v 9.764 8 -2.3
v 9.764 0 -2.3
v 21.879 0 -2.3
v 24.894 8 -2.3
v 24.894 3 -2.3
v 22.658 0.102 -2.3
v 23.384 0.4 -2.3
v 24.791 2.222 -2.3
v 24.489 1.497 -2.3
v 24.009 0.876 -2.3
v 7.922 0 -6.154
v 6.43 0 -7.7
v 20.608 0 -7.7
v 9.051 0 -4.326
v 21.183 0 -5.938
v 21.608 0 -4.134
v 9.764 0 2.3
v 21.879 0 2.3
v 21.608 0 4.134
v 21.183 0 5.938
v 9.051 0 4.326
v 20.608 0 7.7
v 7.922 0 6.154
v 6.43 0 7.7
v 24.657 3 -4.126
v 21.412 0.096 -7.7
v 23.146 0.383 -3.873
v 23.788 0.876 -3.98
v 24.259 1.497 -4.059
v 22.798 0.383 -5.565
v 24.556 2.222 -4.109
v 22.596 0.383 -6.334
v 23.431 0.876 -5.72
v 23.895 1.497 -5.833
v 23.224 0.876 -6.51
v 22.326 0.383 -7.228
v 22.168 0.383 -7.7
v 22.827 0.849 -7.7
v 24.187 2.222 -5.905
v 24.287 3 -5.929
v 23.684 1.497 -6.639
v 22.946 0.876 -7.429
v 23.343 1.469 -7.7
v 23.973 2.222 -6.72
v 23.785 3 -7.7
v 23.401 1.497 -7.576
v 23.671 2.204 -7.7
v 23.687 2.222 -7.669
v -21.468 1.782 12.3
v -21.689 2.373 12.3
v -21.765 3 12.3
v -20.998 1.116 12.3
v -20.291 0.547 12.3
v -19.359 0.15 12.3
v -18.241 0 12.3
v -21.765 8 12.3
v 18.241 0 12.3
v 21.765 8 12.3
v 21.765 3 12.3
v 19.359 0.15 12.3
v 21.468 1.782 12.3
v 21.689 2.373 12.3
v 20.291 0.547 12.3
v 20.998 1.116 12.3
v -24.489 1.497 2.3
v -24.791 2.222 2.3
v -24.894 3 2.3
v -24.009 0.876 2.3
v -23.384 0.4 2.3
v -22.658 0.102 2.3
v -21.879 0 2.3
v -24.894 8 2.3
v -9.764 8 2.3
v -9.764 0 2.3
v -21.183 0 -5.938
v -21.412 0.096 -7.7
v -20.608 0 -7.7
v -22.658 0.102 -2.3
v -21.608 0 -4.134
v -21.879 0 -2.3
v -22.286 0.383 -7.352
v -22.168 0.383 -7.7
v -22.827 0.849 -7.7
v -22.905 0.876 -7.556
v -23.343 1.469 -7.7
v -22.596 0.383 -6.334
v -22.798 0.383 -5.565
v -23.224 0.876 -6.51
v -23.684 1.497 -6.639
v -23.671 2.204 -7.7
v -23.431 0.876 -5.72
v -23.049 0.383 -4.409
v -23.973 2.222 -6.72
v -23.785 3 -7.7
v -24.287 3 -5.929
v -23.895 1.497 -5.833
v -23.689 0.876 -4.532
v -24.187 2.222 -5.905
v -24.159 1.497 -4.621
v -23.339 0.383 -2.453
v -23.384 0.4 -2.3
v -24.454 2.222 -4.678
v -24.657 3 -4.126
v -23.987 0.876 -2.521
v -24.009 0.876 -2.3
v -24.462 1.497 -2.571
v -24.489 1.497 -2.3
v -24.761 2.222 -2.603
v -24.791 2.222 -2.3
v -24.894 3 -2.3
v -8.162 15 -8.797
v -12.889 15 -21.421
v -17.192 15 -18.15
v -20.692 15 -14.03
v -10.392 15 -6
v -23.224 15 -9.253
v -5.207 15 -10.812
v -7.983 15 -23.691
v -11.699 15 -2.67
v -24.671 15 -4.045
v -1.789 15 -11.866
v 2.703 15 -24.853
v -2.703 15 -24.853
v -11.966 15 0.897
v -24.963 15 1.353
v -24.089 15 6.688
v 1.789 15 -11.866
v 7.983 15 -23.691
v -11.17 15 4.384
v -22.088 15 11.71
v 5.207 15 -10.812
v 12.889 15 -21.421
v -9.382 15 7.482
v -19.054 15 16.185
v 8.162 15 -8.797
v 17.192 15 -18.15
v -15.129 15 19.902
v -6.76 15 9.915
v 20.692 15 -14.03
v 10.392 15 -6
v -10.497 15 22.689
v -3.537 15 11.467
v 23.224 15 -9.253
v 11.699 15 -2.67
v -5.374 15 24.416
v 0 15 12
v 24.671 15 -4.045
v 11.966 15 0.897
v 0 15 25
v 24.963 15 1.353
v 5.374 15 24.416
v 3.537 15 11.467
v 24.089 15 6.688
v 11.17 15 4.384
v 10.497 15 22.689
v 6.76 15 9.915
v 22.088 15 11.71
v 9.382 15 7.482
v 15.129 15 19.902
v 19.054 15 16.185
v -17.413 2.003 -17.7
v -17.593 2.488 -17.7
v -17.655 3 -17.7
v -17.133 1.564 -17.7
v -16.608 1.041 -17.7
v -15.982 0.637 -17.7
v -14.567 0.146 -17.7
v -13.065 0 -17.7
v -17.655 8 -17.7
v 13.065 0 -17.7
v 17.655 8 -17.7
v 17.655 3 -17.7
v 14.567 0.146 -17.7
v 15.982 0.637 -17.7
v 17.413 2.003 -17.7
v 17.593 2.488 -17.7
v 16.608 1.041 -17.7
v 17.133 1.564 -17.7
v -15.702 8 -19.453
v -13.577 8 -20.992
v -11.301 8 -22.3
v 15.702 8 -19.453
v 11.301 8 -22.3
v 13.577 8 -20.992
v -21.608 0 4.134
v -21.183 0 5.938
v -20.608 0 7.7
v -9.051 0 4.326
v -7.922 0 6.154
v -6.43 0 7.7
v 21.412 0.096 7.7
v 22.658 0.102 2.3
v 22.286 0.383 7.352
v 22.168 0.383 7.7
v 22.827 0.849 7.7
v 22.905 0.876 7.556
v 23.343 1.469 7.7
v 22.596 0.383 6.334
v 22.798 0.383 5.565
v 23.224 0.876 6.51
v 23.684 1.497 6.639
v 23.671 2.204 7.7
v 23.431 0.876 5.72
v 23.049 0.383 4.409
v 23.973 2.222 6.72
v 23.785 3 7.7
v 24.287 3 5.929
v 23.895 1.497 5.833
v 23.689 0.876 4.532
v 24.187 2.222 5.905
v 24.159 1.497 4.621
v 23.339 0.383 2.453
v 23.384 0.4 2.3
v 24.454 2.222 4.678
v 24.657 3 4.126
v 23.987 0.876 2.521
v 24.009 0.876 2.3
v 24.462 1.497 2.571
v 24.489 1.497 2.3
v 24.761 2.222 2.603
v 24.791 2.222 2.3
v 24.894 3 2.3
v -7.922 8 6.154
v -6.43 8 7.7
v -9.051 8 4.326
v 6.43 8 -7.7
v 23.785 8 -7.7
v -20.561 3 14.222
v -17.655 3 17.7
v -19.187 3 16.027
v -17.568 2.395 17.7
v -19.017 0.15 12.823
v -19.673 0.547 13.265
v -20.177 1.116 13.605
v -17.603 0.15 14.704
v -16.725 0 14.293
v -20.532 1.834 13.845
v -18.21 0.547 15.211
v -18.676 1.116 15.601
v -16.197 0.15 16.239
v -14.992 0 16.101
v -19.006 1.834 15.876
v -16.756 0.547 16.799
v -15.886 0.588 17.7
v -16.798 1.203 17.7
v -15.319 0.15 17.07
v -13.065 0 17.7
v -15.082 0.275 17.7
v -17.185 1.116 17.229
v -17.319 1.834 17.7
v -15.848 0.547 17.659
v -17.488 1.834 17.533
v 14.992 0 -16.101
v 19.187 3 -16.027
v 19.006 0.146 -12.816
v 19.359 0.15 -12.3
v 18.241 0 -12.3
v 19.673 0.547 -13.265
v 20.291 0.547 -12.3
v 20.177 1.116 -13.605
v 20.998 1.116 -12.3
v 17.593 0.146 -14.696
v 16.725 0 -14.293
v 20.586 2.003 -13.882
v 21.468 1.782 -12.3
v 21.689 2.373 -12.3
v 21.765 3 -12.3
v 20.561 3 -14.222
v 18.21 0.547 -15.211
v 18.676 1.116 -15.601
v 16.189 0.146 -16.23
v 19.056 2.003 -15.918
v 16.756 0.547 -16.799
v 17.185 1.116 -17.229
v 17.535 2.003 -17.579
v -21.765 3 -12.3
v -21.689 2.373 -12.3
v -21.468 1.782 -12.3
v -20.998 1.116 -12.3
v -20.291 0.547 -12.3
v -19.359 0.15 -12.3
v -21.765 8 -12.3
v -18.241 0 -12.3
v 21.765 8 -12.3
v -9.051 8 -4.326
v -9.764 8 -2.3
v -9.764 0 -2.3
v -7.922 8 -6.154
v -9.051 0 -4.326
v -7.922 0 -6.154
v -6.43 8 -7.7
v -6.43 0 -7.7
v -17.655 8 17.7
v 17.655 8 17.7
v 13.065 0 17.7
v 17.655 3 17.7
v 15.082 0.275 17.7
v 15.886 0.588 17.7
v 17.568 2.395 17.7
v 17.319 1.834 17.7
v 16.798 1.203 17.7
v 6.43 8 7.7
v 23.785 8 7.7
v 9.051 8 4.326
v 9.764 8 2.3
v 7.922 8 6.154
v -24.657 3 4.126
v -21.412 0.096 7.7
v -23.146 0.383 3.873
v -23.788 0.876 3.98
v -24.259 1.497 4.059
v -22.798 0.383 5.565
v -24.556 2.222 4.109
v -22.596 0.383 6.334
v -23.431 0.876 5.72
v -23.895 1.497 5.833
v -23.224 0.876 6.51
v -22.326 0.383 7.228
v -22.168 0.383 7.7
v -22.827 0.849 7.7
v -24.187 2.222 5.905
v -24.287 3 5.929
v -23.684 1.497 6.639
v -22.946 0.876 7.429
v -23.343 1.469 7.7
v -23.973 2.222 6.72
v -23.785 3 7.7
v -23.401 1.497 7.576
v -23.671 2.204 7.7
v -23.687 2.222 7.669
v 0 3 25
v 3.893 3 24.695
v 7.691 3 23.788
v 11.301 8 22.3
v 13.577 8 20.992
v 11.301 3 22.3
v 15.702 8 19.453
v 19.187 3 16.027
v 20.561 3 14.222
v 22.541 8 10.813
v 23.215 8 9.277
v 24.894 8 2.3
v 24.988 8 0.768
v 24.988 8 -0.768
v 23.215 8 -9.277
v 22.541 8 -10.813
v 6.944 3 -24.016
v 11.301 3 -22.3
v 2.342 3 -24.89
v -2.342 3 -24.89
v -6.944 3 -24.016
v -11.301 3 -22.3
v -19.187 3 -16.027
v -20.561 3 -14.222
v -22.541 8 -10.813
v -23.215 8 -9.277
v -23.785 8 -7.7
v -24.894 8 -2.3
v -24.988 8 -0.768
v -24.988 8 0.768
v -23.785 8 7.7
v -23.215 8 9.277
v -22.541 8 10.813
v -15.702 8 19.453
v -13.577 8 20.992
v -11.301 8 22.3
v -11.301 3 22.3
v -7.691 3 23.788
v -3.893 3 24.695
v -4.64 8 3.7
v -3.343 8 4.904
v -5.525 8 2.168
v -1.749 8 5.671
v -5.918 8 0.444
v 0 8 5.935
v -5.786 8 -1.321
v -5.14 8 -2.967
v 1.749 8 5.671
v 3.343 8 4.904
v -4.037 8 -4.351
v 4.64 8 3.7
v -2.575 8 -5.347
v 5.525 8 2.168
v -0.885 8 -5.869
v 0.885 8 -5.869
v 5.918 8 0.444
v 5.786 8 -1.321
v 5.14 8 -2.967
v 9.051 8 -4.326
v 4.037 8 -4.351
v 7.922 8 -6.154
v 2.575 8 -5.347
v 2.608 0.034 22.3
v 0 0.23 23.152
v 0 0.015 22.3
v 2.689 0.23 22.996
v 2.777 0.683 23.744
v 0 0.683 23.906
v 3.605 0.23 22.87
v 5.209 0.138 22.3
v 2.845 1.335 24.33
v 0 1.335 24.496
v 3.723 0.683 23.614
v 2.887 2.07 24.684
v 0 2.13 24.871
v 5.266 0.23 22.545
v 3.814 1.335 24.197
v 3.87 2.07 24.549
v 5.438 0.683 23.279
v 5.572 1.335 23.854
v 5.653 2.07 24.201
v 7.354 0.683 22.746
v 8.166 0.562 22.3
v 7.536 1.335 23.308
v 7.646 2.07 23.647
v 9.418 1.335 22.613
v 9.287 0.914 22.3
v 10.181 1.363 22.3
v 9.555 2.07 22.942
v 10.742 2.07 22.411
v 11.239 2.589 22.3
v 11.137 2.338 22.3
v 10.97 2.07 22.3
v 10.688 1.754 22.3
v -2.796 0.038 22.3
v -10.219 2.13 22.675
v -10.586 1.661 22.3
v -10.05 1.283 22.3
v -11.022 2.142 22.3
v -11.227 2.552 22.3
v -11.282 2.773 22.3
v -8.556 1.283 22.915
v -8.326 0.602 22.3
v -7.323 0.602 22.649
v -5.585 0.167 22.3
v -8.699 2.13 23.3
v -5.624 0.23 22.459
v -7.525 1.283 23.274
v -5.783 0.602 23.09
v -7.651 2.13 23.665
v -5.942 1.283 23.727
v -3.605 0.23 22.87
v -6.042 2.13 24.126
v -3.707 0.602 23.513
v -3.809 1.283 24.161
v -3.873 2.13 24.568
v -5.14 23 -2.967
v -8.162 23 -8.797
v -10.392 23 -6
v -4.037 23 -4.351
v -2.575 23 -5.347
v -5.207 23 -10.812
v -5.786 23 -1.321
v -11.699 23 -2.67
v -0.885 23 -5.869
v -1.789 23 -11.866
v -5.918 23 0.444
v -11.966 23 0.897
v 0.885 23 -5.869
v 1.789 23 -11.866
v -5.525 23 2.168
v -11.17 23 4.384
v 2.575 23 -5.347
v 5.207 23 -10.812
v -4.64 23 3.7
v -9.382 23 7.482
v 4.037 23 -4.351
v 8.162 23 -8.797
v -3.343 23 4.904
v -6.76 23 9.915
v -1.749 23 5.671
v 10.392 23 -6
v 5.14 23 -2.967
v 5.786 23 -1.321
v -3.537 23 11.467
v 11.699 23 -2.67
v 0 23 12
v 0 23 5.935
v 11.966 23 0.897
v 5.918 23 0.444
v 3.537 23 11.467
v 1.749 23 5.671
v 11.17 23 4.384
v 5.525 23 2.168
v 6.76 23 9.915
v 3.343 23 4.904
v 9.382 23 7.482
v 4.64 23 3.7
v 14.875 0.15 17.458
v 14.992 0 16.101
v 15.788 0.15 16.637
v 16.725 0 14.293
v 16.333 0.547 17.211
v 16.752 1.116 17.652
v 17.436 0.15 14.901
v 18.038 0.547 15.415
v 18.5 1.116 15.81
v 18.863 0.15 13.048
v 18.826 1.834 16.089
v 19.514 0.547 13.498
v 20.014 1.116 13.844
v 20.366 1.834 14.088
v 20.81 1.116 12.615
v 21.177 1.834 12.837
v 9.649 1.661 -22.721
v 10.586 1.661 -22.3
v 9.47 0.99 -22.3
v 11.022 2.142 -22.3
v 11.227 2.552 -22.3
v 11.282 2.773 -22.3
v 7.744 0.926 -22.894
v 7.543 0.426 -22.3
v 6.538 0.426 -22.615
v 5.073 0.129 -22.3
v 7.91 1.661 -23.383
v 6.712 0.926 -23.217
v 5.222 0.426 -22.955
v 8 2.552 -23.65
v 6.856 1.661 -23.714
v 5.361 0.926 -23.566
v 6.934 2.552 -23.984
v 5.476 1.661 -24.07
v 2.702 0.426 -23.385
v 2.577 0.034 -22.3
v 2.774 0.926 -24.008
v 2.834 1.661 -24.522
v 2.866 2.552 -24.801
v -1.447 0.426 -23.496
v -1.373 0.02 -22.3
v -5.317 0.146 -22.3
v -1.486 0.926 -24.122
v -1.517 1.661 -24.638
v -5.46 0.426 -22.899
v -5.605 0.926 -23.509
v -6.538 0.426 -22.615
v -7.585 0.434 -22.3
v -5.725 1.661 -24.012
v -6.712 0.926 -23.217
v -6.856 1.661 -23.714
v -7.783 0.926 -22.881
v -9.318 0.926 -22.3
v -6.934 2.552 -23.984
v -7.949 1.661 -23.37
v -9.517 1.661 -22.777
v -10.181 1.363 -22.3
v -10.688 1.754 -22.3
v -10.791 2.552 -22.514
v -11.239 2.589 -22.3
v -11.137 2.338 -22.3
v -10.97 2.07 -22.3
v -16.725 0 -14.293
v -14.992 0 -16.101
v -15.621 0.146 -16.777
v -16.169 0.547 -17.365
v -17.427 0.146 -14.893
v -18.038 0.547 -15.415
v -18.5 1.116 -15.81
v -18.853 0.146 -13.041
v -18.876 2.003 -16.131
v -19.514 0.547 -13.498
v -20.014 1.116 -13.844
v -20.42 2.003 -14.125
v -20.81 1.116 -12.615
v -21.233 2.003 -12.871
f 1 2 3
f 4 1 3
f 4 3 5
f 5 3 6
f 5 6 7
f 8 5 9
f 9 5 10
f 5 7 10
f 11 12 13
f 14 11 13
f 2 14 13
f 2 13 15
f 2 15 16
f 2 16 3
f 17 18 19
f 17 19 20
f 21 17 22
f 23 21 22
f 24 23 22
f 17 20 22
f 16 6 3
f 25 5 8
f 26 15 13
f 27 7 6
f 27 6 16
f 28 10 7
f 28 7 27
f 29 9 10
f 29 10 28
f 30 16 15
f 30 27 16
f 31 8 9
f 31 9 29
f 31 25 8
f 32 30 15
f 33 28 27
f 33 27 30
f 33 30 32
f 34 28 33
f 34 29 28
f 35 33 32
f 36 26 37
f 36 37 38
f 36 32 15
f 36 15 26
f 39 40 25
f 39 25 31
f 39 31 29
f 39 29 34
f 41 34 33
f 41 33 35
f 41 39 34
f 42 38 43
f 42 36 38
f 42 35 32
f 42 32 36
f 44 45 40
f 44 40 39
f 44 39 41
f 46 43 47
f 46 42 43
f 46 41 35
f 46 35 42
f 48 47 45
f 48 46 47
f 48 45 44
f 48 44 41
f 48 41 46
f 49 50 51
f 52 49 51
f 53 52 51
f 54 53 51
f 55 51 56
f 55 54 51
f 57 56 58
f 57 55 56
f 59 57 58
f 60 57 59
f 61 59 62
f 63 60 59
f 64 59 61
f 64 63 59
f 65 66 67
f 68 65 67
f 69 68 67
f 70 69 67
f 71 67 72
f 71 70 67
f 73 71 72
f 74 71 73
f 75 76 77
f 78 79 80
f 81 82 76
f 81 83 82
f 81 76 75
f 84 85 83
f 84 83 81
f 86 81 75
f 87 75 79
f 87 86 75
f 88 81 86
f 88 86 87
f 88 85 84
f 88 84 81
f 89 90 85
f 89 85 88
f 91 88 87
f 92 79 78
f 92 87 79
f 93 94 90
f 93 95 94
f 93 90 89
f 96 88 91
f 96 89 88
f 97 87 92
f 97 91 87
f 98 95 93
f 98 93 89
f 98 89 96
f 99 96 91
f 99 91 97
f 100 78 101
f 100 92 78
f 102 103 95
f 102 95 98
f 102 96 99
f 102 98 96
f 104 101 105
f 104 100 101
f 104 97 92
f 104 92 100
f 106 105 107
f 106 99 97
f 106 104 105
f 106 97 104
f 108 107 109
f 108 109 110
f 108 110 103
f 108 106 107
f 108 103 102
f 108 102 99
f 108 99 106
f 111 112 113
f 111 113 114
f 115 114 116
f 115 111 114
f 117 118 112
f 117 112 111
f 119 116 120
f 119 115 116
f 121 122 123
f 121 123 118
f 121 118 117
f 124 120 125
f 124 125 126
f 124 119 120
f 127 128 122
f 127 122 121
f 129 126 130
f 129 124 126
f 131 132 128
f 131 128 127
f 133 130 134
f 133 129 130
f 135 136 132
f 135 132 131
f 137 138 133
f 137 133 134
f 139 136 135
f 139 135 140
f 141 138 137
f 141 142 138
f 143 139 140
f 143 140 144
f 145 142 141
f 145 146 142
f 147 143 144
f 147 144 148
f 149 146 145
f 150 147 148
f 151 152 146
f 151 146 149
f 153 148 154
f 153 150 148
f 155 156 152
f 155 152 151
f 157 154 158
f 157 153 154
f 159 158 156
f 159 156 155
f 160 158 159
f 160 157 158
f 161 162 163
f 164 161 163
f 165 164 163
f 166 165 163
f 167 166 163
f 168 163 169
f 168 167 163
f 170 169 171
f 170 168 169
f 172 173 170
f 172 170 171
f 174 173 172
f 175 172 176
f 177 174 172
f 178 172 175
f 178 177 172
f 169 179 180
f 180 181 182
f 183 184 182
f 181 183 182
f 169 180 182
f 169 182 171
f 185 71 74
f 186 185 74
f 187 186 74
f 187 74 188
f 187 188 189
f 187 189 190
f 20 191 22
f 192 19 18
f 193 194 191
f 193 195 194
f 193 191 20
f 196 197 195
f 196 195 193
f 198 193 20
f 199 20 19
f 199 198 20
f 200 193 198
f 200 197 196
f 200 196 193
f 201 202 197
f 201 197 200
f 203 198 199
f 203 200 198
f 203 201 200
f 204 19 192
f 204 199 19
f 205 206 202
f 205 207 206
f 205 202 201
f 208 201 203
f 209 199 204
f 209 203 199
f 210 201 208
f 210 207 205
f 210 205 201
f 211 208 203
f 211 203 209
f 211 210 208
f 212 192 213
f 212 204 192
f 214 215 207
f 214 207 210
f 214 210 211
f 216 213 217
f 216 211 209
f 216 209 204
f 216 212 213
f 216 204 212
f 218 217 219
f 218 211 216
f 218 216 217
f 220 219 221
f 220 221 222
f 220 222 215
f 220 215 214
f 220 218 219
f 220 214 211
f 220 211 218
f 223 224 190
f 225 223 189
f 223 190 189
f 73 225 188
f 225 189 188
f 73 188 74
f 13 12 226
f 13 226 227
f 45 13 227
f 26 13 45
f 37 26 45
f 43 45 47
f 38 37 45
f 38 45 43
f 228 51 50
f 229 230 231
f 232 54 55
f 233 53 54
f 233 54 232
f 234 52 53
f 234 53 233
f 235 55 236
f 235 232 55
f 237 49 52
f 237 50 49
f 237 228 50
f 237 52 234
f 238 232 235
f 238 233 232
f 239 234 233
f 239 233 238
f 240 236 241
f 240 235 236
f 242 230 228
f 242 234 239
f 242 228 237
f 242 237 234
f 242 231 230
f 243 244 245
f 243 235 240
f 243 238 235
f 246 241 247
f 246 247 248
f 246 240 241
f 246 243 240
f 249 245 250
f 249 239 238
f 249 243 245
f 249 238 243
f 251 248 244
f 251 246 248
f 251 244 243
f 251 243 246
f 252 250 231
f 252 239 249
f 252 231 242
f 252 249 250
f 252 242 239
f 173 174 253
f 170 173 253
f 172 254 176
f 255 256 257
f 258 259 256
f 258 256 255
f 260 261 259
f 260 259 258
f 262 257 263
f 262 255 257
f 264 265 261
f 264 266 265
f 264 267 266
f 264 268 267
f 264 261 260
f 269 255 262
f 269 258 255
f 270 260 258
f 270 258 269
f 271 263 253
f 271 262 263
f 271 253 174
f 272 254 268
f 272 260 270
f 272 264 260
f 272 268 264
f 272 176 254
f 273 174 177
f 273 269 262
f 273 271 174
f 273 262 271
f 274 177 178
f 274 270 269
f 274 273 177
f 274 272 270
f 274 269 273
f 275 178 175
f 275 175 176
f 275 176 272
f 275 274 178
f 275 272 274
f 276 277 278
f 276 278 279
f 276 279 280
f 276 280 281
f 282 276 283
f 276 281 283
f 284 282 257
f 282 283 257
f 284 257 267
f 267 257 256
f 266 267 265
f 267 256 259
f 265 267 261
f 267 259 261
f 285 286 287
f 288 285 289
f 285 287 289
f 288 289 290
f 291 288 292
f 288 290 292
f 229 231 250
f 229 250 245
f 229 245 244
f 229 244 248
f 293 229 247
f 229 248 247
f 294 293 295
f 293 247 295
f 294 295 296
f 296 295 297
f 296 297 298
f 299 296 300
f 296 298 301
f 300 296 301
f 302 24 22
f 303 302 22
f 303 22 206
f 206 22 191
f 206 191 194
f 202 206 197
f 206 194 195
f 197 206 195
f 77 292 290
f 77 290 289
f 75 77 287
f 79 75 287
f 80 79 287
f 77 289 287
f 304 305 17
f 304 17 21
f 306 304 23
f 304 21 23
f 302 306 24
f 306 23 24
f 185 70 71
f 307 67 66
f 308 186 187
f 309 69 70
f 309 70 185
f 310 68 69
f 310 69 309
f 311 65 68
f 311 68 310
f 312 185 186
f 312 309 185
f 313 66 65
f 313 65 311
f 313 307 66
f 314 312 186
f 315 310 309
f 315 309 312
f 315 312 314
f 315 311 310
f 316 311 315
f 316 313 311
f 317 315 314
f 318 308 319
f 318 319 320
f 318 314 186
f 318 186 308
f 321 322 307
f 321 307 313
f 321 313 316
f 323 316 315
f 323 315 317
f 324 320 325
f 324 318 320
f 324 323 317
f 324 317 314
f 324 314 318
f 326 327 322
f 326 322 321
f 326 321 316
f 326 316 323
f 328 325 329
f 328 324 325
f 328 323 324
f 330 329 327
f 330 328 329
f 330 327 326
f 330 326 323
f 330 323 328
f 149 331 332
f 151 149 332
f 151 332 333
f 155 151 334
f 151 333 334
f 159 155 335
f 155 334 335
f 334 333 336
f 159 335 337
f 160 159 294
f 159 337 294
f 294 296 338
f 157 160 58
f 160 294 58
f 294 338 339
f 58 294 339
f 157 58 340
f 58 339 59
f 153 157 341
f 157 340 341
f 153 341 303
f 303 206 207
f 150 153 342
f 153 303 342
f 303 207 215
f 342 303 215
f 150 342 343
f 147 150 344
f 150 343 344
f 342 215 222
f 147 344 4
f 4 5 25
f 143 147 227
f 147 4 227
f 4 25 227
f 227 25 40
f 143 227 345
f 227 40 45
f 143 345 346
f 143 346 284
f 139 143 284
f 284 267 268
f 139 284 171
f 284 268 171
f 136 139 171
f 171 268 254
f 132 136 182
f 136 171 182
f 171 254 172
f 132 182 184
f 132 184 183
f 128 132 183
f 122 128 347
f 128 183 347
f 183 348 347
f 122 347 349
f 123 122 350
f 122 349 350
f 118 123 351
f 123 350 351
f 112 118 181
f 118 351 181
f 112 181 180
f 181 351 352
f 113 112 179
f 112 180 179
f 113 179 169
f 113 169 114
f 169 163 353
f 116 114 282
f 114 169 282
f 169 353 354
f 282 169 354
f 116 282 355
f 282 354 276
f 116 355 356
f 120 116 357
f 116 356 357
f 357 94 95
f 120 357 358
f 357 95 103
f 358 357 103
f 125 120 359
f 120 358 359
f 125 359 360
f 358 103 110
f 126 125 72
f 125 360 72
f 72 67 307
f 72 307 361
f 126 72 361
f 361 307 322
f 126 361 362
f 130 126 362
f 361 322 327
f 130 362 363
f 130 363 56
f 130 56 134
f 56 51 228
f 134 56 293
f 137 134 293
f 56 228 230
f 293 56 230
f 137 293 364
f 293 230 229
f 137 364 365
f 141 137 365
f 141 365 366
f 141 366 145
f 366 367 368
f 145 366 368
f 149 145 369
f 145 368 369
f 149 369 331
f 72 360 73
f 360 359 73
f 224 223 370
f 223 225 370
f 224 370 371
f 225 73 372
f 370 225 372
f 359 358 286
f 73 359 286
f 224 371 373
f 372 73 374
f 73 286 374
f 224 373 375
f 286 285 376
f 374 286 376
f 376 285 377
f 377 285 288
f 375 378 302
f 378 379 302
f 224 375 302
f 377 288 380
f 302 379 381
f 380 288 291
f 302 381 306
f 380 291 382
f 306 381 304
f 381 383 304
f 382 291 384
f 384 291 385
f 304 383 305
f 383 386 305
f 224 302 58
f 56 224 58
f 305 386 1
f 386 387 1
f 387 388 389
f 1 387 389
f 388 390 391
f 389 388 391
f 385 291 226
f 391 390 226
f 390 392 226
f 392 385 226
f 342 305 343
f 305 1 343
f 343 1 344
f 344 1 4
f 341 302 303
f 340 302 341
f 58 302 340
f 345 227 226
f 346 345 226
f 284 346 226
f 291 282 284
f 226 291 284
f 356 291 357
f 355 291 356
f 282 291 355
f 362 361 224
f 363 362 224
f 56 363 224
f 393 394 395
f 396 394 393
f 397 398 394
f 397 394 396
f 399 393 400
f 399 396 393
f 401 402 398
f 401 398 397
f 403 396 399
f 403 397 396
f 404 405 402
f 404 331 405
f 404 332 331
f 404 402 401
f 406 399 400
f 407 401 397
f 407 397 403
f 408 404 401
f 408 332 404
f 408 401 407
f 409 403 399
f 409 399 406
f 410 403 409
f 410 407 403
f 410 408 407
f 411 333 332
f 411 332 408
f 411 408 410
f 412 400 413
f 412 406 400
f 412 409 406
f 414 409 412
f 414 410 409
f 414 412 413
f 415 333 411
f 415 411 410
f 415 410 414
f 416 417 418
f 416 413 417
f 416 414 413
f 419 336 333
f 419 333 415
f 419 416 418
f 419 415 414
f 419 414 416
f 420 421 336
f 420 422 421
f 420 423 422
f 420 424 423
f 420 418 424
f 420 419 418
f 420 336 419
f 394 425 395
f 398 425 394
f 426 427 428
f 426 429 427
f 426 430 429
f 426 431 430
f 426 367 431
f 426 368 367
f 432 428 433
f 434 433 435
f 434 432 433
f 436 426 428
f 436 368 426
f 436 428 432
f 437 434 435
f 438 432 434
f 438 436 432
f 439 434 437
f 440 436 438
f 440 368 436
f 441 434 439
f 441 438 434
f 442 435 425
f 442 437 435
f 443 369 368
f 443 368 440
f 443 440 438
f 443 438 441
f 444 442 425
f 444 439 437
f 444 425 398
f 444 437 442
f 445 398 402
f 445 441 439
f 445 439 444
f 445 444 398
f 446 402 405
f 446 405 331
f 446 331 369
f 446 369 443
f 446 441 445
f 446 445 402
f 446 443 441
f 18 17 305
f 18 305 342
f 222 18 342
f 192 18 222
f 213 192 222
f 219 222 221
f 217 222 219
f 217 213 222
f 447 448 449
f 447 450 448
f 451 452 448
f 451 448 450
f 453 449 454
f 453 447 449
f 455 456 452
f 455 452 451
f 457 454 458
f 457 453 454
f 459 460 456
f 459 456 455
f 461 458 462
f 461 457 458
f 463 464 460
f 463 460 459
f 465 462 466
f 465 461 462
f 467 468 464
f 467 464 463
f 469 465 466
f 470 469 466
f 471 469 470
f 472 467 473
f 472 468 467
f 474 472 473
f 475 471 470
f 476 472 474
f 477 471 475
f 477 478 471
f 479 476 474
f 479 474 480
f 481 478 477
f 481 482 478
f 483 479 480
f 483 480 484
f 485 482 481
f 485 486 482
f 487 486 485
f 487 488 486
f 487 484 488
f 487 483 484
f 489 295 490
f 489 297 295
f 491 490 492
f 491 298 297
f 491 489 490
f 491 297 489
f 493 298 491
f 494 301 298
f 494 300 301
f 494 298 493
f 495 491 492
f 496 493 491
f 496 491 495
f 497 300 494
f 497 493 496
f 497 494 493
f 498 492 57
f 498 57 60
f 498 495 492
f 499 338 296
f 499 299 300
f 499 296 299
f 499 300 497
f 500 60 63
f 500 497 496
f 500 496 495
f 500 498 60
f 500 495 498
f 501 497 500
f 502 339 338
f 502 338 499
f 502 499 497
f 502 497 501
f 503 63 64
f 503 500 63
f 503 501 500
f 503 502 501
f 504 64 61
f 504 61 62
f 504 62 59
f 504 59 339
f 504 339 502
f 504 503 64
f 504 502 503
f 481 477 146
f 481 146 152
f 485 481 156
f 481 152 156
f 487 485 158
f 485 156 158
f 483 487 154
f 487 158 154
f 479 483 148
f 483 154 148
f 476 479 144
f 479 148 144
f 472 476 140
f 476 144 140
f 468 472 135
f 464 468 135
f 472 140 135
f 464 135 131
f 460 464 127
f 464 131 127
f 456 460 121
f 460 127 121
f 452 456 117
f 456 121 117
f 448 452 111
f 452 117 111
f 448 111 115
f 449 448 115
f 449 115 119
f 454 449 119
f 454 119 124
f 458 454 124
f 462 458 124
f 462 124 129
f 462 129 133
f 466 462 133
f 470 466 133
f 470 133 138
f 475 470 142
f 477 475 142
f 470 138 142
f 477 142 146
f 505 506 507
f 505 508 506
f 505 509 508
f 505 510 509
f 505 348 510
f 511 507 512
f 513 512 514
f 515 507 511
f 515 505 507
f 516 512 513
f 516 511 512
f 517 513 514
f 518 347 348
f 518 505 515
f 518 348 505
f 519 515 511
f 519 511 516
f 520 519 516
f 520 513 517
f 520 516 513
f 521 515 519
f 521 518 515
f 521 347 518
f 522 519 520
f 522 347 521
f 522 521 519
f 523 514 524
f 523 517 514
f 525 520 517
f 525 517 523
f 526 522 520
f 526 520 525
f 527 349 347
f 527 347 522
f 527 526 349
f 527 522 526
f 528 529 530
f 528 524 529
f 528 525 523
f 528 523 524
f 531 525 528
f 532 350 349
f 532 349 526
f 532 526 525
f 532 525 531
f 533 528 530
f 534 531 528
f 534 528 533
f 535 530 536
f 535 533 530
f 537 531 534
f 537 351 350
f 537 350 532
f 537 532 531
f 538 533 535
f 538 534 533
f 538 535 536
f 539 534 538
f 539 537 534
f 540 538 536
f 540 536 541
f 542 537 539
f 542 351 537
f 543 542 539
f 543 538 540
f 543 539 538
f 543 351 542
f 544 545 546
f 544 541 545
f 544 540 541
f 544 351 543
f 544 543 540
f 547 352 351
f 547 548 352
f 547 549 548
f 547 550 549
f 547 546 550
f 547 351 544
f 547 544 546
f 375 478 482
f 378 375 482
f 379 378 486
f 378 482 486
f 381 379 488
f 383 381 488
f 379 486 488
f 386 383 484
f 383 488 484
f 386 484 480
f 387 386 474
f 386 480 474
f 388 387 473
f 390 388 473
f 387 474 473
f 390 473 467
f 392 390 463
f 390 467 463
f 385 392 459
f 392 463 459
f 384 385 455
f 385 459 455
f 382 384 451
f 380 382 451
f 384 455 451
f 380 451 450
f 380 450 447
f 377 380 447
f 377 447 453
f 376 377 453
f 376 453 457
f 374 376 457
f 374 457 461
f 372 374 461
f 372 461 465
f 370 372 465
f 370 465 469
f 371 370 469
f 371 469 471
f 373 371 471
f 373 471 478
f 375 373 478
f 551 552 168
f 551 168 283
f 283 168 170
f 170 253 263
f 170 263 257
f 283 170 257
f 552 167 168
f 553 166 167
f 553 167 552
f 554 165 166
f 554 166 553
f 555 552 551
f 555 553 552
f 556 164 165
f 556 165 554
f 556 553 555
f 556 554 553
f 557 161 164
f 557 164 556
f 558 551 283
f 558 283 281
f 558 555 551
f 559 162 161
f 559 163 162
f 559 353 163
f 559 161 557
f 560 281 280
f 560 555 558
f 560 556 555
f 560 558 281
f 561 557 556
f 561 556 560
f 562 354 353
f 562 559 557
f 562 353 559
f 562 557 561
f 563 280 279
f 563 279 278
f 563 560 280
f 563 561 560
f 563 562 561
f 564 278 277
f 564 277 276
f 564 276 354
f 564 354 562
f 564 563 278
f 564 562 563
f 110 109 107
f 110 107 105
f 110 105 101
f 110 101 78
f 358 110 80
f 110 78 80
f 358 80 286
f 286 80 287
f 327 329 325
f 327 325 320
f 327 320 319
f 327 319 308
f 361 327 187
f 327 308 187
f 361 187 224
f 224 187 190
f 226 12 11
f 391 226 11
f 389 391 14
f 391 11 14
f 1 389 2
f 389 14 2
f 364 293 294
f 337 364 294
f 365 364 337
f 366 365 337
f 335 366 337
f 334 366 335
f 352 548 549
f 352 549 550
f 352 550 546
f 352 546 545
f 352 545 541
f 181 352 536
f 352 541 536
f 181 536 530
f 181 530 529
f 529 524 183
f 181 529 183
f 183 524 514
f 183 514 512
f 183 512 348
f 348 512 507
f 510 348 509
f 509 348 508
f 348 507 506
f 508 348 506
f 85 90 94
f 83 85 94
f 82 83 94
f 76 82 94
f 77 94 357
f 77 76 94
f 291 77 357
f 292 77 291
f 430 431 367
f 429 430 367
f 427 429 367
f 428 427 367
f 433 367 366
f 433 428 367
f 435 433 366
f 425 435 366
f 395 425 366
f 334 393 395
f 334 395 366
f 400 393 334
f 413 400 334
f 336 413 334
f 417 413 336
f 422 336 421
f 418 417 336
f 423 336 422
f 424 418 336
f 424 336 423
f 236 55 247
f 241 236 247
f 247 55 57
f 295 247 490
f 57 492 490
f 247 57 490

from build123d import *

# Parameters (mm, degrees)
SKETCH1_R             = 25
BOSS_EXTRUDE1_DEPTH   = 15
SKETCH14_W            = 53.859934174
SKETCH14_H            = 4.599425072
CUT_EXTRUDE13_DEPTH   = 8
LPATTERN11_COUNT      = 4
LPATTERN11_PITCH      = 10
LPATTERN11_COUNT_DIR2 = 4
LPATTERN11_PITCH_DIR2 = 10
SKETCH18_R            = 10.031636401
CUT_EXTRUDE15_DEPTH   = 8
SKETCH16_R            = 12
BOSS_EXTRUDE3_DEPTH   = 8
SKETCH19_R            = 5.934931829
CUT_EXTRUDE16_DEPTH   = 26
FILLET2_R             = 3
FILLET3_R             = 3


with BuildPart() as part:
    # Sketch1 → Boss-Extrude1 (new body)
    with BuildSketch(Plane(origin=(0, 0, 0), x_dir=(1, 0, 0), z_dir=(0, 1, 0))):
        with Locations(Location((0, 0, 0), (0, 0, 270))):
            Circle(SKETCH1_R)
    extrude(amount=BOSS_EXTRUDE1_DEPTH)

    # Sketch14 → Cut-Extrude13 (cut)
    with BuildSketch(Plane(origin=(0, 0, 0), x_dir=(1, 0, 0), z_dir=(0, 1, 0))):
        Rectangle(SKETCH14_W, SKETCH14_H)
    cut_extrude13 = extrude(amount=CUT_EXTRUDE13_DEPTH, mode=Mode.SUBTRACT)

    # LPattern11: Cut-Extrude13 4 × 4
    with Locations(*[Vector(0, 0, 1) * (i * LPATTERN11_PITCH) + Vector(0, 0, -1) * (j * LPATTERN11_PITCH_DIR2) for i in range(LPATTERN11_COUNT) for j in range(LPATTERN11_COUNT_DIR2) if (i, j) != (0, 0)]):
        add(cut_extrude13, mode=Mode.SUBTRACT)

    # Sketch18 → Cut-Extrude15 (cut)
    with BuildSketch(Plane.XZ):
        Circle(SKETCH18_R)
    extrude(amount=-CUT_EXTRUDE15_DEPTH, mode=Mode.SUBTRACT)

    # Sketch16 → Boss-Extrude3 (add)
    with BuildSketch(Plane(origin=(0, 15, 0), x_dir=(1, 0, 0), z_dir=(0, 1, 0))):
        with Locations(Location((0, 0, 0), (0, 0, 270))):
            Circle(SKETCH16_R)
    extrude(amount=BOSS_EXTRUDE3_DEPTH)

    # Sketch19 → Cut-Extrude16 (cut)
    with BuildSketch(Plane(origin=(0, 23, 0), x_dir=(1, 0, 0), z_dir=(0, 1, 0))):
        with Locations(Location((0, 0, 0), (0, 0, 270))):
            Circle(SKETCH19_R)
    extrude(amount=-CUT_EXTRUDE16_DEPTH, mode=Mode.SUBTRACT)

    # Fillet2
    # the kernel refuses this fillet: 3 mm, written as the material it takes off along each edge
    with BuildSketch(Plane(origin=(0, 0, 0), x_dir=(0, 0, 1), z_dir=(-1, 0, 0))) as fillet2_piece_1_section:
        with BuildLine():
            CenterArc((25 - FILLET2_R, FILLET2_R), FILLET2_R, 270, 90)
            Line((25 - FILLET2_R, 0), (25, 0))
            Line((25, 0), (25, FILLET2_R))
        make_face()
    fillet2_piece_1 = revolve(axis=Axis((0, 0, 0), (0, 1, 0)), revolution_arc=44.06515492, mode=Mode.PRIVATE)
    fillet2_piece_1 = split(fillet2_piece_1, bisect_by=Plane(origin=(5.02070906, 0.724658167, 17.700287464), z_dir=(0, 0, 1)), keep=Keep.TOP, mode=Mode.PRIVATE)
    add(fillet2_piece_1, mode=Mode.SUBTRACT)
    with BuildSketch(Plane(origin=(0, 0, 0), x_dir=(-0.6954759312446767, 0, 0.7185493922197345), z_dir=(-0.7185493922197345, 0, -0.6954759312446767))) as fillet2_piece_2_section:
        with BuildLine():
            CenterArc((25 - FILLET2_R, FILLET2_R), FILLET2_R, 270, 90)
            Line((25 - FILLET2_R, 0), (25, 0))
            Line((25, 0), (25, FILLET2_R))
        make_face()
    fillet2_piece_2 = revolve(axis=Axis((0, 0, 0), (0, 1, 0)), revolution_arc=44.06515492, mode=Mode.PRIVATE)
    fillet2_piece_2 = split(fillet2_piece_2, bisect_by=Plane(origin=(-5.02071043, 0.724658948, 17.700287464), z_dir=(0, 0, 1)), keep=Keep.TOP, mode=Mode.PRIVATE)
    add(fillet2_piece_2, mode=Mode.SUBTRACT)

    # Fillet3
    # the kernel refuses this fillet: 3 mm, written as the material it takes off along each edge
    with BuildSketch(Plane(origin=(0, 0, 0), x_dir=(0.6954990930978064, 0, -0.7185269733977484), z_dir=(0.7185269733977484, 0, 0.6954990930978064))) as fillet3_piece_1:
        with BuildLine():
            CenterArc((25 - FILLET3_R, FILLET3_R), FILLET3_R, 270, 90)
            Line((25 - FILLET3_R, 0), (25, 0))
            Line((25, 0), (25, FILLET3_R))
        make_face()
    revolve(axis=Axis((0, 0, 0), (0, 1, 0)), revolution_arc=88.134003662, mode=Mode.SUBTRACT)
    with BuildSketch(Plane(origin=(0, 0, 0), x_dir=(0.9771108822908511, 0, -0.21273063650728477), z_dir=(0.21273063650728477, 0, 0.9771108822908511))) as fillet3_piece_2:
        with BuildLine():
            CenterArc((25 - FILLET3_R, FILLET3_R), FILLET3_R, 270, 90)
            Line((25 - FILLET3_R, 0), (25, 0))
            Line((25, 0), (25, FILLET3_R))
        make_face()
    revolve(axis=Axis((0, 0, 0), (0, 1, 0)), revolution_arc=49.979873443, mode=Mode.SUBTRACT)
    with BuildSketch(Plane(origin=(0, 0, 0), x_dir=(-0.46542458400640074, 0, -0.8850875417733937), z_dir=(0.8850875417733937, 0, -0.46542458400640074))) as fillet3_piece_3:
        with BuildLine():
            CenterArc((25 - FILLET3_R, FILLET3_R), FILLET3_R, 270, 90)
            Line((25 - FILLET3_R, 0), (25, 0))
            Line((25, 0), (25, FILLET3_R))
        make_face()
    revolve(axis=Axis((0, 0, 0), (0, 1, 0)), revolution_arc=49.979873443, mode=Mode.SUBTRACT)
    with BuildSketch(Plane(origin=(0, 0, 0), x_dir=(0.9784698974402165, 0, 0.20638958259401557), z_dir=(-0.20638958259401557, 0, 0.9784698974402165))) as fillet3_piece_4:
        with BuildLine():
            CenterArc((25 - FILLET3_R, FILLET3_R), FILLET3_R, 270, 90)
            Line((25 - FILLET3_R, 0), (25, 0))
            Line((25, 0), (25, FILLET3_R))
        make_face()
    revolve(axis=Axis((0, 0, 0), (0, 1, 0)), revolution_arc=47.03916142, mode=Mode.SUBTRACT)
    with BuildSketch(Plane(origin=(0, 0, 0), x_dir=(-0.8178655518658356, 0, -0.5754093665132607), z_dir=(0.5754093665132607, 0, -0.8178655518658356))) as fillet3_piece_5:
        with BuildLine():
            CenterArc((25 - FILLET3_R, FILLET3_R), FILLET3_R, 270, 90)
            Line((25 - FILLET3_R, 0), (25, 0))
            Line((25, 0), (25, FILLET3_R))
        make_face()
    revolve(axis=Axis((0, 0, 0), (0, 1, 0)), revolution_arc=47.03916142, mode=Mode.SUBTRACT)
    with BuildSketch(Plane(origin=(0, 0, 0), x_dir=(0.8178655518658215, 0, 0.5754093665132807), z_dir=(-0.5754093665132807, 0, 0.8178655518658215))) as fillet3_piece_6:
        with BuildLine():
            CenterArc((25 - FILLET3_R, FILLET3_R), FILLET3_R, 270, 90)
            Line((25 - FILLET3_R, 0), (25, 0))
            Line((25, 0), (25, FILLET3_R))
        make_face()
    revolve(axis=Axis((0, 0, 0), (0, 1, 0)), revolution_arc=47.03916142, mode=Mode.SUBTRACT)
    with BuildSketch(Plane(origin=(0, 0, 0), x_dir=(-0.9784698974402178, 0, -0.20638958259400958), z_dir=(0.20638958259400958, 0, -0.9784698974402178))) as fillet3_piece_7:
        with BuildLine():
            CenterArc((25 - FILLET3_R, FILLET3_R), FILLET3_R, 270, 90)
            Line((25 - FILLET3_R, 0), (25, 0))
            Line((25, 0), (25, FILLET3_R))
        make_face()
    revolve(axis=Axis((0, 0, 0), (0, 1, 0)), revolution_arc=47.03916142, mode=Mode.SUBTRACT)
    with BuildSketch(Plane(origin=(0, 0, 0), x_dir=(0.4654245840063838, 0, 0.8850875417734027), z_dir=(-0.8850875417734027, 0, 0.4654245840063838))) as fillet3_piece_8:
        with BuildLine():
            CenterArc((25 - FILLET3_R, FILLET3_R), FILLET3_R, 270, 90)
            Line((25 - FILLET3_R, 0), (25, 0))
            Line((25, 0), (25, FILLET3_R))
        make_face()
    revolve(axis=Axis((0, 0, 0), (0, 1, 0)), revolution_arc=49.979873443, mode=Mode.SUBTRACT)
    with BuildSketch(Plane(origin=(0, 0, 0), x_dir=(-0.9771108822908537, 0, 0.2127306365072725), z_dir=(-0.2127306365072725, 0, -0.9771108822908537))) as fillet3_piece_9:
        with BuildLine():
            CenterArc((25 - FILLET3_R, FILLET3_R), FILLET3_R, 270, 90)
            Line((25 - FILLET3_R, 0), (25, 0))
            Line((25, 0), (25, FILLET3_R))
        make_face()
    revolve(axis=Axis((0, 0, 0), (0, 1, 0)), revolution_arc=49.979873443, mode=Mode.SUBTRACT)


solid = part.part
